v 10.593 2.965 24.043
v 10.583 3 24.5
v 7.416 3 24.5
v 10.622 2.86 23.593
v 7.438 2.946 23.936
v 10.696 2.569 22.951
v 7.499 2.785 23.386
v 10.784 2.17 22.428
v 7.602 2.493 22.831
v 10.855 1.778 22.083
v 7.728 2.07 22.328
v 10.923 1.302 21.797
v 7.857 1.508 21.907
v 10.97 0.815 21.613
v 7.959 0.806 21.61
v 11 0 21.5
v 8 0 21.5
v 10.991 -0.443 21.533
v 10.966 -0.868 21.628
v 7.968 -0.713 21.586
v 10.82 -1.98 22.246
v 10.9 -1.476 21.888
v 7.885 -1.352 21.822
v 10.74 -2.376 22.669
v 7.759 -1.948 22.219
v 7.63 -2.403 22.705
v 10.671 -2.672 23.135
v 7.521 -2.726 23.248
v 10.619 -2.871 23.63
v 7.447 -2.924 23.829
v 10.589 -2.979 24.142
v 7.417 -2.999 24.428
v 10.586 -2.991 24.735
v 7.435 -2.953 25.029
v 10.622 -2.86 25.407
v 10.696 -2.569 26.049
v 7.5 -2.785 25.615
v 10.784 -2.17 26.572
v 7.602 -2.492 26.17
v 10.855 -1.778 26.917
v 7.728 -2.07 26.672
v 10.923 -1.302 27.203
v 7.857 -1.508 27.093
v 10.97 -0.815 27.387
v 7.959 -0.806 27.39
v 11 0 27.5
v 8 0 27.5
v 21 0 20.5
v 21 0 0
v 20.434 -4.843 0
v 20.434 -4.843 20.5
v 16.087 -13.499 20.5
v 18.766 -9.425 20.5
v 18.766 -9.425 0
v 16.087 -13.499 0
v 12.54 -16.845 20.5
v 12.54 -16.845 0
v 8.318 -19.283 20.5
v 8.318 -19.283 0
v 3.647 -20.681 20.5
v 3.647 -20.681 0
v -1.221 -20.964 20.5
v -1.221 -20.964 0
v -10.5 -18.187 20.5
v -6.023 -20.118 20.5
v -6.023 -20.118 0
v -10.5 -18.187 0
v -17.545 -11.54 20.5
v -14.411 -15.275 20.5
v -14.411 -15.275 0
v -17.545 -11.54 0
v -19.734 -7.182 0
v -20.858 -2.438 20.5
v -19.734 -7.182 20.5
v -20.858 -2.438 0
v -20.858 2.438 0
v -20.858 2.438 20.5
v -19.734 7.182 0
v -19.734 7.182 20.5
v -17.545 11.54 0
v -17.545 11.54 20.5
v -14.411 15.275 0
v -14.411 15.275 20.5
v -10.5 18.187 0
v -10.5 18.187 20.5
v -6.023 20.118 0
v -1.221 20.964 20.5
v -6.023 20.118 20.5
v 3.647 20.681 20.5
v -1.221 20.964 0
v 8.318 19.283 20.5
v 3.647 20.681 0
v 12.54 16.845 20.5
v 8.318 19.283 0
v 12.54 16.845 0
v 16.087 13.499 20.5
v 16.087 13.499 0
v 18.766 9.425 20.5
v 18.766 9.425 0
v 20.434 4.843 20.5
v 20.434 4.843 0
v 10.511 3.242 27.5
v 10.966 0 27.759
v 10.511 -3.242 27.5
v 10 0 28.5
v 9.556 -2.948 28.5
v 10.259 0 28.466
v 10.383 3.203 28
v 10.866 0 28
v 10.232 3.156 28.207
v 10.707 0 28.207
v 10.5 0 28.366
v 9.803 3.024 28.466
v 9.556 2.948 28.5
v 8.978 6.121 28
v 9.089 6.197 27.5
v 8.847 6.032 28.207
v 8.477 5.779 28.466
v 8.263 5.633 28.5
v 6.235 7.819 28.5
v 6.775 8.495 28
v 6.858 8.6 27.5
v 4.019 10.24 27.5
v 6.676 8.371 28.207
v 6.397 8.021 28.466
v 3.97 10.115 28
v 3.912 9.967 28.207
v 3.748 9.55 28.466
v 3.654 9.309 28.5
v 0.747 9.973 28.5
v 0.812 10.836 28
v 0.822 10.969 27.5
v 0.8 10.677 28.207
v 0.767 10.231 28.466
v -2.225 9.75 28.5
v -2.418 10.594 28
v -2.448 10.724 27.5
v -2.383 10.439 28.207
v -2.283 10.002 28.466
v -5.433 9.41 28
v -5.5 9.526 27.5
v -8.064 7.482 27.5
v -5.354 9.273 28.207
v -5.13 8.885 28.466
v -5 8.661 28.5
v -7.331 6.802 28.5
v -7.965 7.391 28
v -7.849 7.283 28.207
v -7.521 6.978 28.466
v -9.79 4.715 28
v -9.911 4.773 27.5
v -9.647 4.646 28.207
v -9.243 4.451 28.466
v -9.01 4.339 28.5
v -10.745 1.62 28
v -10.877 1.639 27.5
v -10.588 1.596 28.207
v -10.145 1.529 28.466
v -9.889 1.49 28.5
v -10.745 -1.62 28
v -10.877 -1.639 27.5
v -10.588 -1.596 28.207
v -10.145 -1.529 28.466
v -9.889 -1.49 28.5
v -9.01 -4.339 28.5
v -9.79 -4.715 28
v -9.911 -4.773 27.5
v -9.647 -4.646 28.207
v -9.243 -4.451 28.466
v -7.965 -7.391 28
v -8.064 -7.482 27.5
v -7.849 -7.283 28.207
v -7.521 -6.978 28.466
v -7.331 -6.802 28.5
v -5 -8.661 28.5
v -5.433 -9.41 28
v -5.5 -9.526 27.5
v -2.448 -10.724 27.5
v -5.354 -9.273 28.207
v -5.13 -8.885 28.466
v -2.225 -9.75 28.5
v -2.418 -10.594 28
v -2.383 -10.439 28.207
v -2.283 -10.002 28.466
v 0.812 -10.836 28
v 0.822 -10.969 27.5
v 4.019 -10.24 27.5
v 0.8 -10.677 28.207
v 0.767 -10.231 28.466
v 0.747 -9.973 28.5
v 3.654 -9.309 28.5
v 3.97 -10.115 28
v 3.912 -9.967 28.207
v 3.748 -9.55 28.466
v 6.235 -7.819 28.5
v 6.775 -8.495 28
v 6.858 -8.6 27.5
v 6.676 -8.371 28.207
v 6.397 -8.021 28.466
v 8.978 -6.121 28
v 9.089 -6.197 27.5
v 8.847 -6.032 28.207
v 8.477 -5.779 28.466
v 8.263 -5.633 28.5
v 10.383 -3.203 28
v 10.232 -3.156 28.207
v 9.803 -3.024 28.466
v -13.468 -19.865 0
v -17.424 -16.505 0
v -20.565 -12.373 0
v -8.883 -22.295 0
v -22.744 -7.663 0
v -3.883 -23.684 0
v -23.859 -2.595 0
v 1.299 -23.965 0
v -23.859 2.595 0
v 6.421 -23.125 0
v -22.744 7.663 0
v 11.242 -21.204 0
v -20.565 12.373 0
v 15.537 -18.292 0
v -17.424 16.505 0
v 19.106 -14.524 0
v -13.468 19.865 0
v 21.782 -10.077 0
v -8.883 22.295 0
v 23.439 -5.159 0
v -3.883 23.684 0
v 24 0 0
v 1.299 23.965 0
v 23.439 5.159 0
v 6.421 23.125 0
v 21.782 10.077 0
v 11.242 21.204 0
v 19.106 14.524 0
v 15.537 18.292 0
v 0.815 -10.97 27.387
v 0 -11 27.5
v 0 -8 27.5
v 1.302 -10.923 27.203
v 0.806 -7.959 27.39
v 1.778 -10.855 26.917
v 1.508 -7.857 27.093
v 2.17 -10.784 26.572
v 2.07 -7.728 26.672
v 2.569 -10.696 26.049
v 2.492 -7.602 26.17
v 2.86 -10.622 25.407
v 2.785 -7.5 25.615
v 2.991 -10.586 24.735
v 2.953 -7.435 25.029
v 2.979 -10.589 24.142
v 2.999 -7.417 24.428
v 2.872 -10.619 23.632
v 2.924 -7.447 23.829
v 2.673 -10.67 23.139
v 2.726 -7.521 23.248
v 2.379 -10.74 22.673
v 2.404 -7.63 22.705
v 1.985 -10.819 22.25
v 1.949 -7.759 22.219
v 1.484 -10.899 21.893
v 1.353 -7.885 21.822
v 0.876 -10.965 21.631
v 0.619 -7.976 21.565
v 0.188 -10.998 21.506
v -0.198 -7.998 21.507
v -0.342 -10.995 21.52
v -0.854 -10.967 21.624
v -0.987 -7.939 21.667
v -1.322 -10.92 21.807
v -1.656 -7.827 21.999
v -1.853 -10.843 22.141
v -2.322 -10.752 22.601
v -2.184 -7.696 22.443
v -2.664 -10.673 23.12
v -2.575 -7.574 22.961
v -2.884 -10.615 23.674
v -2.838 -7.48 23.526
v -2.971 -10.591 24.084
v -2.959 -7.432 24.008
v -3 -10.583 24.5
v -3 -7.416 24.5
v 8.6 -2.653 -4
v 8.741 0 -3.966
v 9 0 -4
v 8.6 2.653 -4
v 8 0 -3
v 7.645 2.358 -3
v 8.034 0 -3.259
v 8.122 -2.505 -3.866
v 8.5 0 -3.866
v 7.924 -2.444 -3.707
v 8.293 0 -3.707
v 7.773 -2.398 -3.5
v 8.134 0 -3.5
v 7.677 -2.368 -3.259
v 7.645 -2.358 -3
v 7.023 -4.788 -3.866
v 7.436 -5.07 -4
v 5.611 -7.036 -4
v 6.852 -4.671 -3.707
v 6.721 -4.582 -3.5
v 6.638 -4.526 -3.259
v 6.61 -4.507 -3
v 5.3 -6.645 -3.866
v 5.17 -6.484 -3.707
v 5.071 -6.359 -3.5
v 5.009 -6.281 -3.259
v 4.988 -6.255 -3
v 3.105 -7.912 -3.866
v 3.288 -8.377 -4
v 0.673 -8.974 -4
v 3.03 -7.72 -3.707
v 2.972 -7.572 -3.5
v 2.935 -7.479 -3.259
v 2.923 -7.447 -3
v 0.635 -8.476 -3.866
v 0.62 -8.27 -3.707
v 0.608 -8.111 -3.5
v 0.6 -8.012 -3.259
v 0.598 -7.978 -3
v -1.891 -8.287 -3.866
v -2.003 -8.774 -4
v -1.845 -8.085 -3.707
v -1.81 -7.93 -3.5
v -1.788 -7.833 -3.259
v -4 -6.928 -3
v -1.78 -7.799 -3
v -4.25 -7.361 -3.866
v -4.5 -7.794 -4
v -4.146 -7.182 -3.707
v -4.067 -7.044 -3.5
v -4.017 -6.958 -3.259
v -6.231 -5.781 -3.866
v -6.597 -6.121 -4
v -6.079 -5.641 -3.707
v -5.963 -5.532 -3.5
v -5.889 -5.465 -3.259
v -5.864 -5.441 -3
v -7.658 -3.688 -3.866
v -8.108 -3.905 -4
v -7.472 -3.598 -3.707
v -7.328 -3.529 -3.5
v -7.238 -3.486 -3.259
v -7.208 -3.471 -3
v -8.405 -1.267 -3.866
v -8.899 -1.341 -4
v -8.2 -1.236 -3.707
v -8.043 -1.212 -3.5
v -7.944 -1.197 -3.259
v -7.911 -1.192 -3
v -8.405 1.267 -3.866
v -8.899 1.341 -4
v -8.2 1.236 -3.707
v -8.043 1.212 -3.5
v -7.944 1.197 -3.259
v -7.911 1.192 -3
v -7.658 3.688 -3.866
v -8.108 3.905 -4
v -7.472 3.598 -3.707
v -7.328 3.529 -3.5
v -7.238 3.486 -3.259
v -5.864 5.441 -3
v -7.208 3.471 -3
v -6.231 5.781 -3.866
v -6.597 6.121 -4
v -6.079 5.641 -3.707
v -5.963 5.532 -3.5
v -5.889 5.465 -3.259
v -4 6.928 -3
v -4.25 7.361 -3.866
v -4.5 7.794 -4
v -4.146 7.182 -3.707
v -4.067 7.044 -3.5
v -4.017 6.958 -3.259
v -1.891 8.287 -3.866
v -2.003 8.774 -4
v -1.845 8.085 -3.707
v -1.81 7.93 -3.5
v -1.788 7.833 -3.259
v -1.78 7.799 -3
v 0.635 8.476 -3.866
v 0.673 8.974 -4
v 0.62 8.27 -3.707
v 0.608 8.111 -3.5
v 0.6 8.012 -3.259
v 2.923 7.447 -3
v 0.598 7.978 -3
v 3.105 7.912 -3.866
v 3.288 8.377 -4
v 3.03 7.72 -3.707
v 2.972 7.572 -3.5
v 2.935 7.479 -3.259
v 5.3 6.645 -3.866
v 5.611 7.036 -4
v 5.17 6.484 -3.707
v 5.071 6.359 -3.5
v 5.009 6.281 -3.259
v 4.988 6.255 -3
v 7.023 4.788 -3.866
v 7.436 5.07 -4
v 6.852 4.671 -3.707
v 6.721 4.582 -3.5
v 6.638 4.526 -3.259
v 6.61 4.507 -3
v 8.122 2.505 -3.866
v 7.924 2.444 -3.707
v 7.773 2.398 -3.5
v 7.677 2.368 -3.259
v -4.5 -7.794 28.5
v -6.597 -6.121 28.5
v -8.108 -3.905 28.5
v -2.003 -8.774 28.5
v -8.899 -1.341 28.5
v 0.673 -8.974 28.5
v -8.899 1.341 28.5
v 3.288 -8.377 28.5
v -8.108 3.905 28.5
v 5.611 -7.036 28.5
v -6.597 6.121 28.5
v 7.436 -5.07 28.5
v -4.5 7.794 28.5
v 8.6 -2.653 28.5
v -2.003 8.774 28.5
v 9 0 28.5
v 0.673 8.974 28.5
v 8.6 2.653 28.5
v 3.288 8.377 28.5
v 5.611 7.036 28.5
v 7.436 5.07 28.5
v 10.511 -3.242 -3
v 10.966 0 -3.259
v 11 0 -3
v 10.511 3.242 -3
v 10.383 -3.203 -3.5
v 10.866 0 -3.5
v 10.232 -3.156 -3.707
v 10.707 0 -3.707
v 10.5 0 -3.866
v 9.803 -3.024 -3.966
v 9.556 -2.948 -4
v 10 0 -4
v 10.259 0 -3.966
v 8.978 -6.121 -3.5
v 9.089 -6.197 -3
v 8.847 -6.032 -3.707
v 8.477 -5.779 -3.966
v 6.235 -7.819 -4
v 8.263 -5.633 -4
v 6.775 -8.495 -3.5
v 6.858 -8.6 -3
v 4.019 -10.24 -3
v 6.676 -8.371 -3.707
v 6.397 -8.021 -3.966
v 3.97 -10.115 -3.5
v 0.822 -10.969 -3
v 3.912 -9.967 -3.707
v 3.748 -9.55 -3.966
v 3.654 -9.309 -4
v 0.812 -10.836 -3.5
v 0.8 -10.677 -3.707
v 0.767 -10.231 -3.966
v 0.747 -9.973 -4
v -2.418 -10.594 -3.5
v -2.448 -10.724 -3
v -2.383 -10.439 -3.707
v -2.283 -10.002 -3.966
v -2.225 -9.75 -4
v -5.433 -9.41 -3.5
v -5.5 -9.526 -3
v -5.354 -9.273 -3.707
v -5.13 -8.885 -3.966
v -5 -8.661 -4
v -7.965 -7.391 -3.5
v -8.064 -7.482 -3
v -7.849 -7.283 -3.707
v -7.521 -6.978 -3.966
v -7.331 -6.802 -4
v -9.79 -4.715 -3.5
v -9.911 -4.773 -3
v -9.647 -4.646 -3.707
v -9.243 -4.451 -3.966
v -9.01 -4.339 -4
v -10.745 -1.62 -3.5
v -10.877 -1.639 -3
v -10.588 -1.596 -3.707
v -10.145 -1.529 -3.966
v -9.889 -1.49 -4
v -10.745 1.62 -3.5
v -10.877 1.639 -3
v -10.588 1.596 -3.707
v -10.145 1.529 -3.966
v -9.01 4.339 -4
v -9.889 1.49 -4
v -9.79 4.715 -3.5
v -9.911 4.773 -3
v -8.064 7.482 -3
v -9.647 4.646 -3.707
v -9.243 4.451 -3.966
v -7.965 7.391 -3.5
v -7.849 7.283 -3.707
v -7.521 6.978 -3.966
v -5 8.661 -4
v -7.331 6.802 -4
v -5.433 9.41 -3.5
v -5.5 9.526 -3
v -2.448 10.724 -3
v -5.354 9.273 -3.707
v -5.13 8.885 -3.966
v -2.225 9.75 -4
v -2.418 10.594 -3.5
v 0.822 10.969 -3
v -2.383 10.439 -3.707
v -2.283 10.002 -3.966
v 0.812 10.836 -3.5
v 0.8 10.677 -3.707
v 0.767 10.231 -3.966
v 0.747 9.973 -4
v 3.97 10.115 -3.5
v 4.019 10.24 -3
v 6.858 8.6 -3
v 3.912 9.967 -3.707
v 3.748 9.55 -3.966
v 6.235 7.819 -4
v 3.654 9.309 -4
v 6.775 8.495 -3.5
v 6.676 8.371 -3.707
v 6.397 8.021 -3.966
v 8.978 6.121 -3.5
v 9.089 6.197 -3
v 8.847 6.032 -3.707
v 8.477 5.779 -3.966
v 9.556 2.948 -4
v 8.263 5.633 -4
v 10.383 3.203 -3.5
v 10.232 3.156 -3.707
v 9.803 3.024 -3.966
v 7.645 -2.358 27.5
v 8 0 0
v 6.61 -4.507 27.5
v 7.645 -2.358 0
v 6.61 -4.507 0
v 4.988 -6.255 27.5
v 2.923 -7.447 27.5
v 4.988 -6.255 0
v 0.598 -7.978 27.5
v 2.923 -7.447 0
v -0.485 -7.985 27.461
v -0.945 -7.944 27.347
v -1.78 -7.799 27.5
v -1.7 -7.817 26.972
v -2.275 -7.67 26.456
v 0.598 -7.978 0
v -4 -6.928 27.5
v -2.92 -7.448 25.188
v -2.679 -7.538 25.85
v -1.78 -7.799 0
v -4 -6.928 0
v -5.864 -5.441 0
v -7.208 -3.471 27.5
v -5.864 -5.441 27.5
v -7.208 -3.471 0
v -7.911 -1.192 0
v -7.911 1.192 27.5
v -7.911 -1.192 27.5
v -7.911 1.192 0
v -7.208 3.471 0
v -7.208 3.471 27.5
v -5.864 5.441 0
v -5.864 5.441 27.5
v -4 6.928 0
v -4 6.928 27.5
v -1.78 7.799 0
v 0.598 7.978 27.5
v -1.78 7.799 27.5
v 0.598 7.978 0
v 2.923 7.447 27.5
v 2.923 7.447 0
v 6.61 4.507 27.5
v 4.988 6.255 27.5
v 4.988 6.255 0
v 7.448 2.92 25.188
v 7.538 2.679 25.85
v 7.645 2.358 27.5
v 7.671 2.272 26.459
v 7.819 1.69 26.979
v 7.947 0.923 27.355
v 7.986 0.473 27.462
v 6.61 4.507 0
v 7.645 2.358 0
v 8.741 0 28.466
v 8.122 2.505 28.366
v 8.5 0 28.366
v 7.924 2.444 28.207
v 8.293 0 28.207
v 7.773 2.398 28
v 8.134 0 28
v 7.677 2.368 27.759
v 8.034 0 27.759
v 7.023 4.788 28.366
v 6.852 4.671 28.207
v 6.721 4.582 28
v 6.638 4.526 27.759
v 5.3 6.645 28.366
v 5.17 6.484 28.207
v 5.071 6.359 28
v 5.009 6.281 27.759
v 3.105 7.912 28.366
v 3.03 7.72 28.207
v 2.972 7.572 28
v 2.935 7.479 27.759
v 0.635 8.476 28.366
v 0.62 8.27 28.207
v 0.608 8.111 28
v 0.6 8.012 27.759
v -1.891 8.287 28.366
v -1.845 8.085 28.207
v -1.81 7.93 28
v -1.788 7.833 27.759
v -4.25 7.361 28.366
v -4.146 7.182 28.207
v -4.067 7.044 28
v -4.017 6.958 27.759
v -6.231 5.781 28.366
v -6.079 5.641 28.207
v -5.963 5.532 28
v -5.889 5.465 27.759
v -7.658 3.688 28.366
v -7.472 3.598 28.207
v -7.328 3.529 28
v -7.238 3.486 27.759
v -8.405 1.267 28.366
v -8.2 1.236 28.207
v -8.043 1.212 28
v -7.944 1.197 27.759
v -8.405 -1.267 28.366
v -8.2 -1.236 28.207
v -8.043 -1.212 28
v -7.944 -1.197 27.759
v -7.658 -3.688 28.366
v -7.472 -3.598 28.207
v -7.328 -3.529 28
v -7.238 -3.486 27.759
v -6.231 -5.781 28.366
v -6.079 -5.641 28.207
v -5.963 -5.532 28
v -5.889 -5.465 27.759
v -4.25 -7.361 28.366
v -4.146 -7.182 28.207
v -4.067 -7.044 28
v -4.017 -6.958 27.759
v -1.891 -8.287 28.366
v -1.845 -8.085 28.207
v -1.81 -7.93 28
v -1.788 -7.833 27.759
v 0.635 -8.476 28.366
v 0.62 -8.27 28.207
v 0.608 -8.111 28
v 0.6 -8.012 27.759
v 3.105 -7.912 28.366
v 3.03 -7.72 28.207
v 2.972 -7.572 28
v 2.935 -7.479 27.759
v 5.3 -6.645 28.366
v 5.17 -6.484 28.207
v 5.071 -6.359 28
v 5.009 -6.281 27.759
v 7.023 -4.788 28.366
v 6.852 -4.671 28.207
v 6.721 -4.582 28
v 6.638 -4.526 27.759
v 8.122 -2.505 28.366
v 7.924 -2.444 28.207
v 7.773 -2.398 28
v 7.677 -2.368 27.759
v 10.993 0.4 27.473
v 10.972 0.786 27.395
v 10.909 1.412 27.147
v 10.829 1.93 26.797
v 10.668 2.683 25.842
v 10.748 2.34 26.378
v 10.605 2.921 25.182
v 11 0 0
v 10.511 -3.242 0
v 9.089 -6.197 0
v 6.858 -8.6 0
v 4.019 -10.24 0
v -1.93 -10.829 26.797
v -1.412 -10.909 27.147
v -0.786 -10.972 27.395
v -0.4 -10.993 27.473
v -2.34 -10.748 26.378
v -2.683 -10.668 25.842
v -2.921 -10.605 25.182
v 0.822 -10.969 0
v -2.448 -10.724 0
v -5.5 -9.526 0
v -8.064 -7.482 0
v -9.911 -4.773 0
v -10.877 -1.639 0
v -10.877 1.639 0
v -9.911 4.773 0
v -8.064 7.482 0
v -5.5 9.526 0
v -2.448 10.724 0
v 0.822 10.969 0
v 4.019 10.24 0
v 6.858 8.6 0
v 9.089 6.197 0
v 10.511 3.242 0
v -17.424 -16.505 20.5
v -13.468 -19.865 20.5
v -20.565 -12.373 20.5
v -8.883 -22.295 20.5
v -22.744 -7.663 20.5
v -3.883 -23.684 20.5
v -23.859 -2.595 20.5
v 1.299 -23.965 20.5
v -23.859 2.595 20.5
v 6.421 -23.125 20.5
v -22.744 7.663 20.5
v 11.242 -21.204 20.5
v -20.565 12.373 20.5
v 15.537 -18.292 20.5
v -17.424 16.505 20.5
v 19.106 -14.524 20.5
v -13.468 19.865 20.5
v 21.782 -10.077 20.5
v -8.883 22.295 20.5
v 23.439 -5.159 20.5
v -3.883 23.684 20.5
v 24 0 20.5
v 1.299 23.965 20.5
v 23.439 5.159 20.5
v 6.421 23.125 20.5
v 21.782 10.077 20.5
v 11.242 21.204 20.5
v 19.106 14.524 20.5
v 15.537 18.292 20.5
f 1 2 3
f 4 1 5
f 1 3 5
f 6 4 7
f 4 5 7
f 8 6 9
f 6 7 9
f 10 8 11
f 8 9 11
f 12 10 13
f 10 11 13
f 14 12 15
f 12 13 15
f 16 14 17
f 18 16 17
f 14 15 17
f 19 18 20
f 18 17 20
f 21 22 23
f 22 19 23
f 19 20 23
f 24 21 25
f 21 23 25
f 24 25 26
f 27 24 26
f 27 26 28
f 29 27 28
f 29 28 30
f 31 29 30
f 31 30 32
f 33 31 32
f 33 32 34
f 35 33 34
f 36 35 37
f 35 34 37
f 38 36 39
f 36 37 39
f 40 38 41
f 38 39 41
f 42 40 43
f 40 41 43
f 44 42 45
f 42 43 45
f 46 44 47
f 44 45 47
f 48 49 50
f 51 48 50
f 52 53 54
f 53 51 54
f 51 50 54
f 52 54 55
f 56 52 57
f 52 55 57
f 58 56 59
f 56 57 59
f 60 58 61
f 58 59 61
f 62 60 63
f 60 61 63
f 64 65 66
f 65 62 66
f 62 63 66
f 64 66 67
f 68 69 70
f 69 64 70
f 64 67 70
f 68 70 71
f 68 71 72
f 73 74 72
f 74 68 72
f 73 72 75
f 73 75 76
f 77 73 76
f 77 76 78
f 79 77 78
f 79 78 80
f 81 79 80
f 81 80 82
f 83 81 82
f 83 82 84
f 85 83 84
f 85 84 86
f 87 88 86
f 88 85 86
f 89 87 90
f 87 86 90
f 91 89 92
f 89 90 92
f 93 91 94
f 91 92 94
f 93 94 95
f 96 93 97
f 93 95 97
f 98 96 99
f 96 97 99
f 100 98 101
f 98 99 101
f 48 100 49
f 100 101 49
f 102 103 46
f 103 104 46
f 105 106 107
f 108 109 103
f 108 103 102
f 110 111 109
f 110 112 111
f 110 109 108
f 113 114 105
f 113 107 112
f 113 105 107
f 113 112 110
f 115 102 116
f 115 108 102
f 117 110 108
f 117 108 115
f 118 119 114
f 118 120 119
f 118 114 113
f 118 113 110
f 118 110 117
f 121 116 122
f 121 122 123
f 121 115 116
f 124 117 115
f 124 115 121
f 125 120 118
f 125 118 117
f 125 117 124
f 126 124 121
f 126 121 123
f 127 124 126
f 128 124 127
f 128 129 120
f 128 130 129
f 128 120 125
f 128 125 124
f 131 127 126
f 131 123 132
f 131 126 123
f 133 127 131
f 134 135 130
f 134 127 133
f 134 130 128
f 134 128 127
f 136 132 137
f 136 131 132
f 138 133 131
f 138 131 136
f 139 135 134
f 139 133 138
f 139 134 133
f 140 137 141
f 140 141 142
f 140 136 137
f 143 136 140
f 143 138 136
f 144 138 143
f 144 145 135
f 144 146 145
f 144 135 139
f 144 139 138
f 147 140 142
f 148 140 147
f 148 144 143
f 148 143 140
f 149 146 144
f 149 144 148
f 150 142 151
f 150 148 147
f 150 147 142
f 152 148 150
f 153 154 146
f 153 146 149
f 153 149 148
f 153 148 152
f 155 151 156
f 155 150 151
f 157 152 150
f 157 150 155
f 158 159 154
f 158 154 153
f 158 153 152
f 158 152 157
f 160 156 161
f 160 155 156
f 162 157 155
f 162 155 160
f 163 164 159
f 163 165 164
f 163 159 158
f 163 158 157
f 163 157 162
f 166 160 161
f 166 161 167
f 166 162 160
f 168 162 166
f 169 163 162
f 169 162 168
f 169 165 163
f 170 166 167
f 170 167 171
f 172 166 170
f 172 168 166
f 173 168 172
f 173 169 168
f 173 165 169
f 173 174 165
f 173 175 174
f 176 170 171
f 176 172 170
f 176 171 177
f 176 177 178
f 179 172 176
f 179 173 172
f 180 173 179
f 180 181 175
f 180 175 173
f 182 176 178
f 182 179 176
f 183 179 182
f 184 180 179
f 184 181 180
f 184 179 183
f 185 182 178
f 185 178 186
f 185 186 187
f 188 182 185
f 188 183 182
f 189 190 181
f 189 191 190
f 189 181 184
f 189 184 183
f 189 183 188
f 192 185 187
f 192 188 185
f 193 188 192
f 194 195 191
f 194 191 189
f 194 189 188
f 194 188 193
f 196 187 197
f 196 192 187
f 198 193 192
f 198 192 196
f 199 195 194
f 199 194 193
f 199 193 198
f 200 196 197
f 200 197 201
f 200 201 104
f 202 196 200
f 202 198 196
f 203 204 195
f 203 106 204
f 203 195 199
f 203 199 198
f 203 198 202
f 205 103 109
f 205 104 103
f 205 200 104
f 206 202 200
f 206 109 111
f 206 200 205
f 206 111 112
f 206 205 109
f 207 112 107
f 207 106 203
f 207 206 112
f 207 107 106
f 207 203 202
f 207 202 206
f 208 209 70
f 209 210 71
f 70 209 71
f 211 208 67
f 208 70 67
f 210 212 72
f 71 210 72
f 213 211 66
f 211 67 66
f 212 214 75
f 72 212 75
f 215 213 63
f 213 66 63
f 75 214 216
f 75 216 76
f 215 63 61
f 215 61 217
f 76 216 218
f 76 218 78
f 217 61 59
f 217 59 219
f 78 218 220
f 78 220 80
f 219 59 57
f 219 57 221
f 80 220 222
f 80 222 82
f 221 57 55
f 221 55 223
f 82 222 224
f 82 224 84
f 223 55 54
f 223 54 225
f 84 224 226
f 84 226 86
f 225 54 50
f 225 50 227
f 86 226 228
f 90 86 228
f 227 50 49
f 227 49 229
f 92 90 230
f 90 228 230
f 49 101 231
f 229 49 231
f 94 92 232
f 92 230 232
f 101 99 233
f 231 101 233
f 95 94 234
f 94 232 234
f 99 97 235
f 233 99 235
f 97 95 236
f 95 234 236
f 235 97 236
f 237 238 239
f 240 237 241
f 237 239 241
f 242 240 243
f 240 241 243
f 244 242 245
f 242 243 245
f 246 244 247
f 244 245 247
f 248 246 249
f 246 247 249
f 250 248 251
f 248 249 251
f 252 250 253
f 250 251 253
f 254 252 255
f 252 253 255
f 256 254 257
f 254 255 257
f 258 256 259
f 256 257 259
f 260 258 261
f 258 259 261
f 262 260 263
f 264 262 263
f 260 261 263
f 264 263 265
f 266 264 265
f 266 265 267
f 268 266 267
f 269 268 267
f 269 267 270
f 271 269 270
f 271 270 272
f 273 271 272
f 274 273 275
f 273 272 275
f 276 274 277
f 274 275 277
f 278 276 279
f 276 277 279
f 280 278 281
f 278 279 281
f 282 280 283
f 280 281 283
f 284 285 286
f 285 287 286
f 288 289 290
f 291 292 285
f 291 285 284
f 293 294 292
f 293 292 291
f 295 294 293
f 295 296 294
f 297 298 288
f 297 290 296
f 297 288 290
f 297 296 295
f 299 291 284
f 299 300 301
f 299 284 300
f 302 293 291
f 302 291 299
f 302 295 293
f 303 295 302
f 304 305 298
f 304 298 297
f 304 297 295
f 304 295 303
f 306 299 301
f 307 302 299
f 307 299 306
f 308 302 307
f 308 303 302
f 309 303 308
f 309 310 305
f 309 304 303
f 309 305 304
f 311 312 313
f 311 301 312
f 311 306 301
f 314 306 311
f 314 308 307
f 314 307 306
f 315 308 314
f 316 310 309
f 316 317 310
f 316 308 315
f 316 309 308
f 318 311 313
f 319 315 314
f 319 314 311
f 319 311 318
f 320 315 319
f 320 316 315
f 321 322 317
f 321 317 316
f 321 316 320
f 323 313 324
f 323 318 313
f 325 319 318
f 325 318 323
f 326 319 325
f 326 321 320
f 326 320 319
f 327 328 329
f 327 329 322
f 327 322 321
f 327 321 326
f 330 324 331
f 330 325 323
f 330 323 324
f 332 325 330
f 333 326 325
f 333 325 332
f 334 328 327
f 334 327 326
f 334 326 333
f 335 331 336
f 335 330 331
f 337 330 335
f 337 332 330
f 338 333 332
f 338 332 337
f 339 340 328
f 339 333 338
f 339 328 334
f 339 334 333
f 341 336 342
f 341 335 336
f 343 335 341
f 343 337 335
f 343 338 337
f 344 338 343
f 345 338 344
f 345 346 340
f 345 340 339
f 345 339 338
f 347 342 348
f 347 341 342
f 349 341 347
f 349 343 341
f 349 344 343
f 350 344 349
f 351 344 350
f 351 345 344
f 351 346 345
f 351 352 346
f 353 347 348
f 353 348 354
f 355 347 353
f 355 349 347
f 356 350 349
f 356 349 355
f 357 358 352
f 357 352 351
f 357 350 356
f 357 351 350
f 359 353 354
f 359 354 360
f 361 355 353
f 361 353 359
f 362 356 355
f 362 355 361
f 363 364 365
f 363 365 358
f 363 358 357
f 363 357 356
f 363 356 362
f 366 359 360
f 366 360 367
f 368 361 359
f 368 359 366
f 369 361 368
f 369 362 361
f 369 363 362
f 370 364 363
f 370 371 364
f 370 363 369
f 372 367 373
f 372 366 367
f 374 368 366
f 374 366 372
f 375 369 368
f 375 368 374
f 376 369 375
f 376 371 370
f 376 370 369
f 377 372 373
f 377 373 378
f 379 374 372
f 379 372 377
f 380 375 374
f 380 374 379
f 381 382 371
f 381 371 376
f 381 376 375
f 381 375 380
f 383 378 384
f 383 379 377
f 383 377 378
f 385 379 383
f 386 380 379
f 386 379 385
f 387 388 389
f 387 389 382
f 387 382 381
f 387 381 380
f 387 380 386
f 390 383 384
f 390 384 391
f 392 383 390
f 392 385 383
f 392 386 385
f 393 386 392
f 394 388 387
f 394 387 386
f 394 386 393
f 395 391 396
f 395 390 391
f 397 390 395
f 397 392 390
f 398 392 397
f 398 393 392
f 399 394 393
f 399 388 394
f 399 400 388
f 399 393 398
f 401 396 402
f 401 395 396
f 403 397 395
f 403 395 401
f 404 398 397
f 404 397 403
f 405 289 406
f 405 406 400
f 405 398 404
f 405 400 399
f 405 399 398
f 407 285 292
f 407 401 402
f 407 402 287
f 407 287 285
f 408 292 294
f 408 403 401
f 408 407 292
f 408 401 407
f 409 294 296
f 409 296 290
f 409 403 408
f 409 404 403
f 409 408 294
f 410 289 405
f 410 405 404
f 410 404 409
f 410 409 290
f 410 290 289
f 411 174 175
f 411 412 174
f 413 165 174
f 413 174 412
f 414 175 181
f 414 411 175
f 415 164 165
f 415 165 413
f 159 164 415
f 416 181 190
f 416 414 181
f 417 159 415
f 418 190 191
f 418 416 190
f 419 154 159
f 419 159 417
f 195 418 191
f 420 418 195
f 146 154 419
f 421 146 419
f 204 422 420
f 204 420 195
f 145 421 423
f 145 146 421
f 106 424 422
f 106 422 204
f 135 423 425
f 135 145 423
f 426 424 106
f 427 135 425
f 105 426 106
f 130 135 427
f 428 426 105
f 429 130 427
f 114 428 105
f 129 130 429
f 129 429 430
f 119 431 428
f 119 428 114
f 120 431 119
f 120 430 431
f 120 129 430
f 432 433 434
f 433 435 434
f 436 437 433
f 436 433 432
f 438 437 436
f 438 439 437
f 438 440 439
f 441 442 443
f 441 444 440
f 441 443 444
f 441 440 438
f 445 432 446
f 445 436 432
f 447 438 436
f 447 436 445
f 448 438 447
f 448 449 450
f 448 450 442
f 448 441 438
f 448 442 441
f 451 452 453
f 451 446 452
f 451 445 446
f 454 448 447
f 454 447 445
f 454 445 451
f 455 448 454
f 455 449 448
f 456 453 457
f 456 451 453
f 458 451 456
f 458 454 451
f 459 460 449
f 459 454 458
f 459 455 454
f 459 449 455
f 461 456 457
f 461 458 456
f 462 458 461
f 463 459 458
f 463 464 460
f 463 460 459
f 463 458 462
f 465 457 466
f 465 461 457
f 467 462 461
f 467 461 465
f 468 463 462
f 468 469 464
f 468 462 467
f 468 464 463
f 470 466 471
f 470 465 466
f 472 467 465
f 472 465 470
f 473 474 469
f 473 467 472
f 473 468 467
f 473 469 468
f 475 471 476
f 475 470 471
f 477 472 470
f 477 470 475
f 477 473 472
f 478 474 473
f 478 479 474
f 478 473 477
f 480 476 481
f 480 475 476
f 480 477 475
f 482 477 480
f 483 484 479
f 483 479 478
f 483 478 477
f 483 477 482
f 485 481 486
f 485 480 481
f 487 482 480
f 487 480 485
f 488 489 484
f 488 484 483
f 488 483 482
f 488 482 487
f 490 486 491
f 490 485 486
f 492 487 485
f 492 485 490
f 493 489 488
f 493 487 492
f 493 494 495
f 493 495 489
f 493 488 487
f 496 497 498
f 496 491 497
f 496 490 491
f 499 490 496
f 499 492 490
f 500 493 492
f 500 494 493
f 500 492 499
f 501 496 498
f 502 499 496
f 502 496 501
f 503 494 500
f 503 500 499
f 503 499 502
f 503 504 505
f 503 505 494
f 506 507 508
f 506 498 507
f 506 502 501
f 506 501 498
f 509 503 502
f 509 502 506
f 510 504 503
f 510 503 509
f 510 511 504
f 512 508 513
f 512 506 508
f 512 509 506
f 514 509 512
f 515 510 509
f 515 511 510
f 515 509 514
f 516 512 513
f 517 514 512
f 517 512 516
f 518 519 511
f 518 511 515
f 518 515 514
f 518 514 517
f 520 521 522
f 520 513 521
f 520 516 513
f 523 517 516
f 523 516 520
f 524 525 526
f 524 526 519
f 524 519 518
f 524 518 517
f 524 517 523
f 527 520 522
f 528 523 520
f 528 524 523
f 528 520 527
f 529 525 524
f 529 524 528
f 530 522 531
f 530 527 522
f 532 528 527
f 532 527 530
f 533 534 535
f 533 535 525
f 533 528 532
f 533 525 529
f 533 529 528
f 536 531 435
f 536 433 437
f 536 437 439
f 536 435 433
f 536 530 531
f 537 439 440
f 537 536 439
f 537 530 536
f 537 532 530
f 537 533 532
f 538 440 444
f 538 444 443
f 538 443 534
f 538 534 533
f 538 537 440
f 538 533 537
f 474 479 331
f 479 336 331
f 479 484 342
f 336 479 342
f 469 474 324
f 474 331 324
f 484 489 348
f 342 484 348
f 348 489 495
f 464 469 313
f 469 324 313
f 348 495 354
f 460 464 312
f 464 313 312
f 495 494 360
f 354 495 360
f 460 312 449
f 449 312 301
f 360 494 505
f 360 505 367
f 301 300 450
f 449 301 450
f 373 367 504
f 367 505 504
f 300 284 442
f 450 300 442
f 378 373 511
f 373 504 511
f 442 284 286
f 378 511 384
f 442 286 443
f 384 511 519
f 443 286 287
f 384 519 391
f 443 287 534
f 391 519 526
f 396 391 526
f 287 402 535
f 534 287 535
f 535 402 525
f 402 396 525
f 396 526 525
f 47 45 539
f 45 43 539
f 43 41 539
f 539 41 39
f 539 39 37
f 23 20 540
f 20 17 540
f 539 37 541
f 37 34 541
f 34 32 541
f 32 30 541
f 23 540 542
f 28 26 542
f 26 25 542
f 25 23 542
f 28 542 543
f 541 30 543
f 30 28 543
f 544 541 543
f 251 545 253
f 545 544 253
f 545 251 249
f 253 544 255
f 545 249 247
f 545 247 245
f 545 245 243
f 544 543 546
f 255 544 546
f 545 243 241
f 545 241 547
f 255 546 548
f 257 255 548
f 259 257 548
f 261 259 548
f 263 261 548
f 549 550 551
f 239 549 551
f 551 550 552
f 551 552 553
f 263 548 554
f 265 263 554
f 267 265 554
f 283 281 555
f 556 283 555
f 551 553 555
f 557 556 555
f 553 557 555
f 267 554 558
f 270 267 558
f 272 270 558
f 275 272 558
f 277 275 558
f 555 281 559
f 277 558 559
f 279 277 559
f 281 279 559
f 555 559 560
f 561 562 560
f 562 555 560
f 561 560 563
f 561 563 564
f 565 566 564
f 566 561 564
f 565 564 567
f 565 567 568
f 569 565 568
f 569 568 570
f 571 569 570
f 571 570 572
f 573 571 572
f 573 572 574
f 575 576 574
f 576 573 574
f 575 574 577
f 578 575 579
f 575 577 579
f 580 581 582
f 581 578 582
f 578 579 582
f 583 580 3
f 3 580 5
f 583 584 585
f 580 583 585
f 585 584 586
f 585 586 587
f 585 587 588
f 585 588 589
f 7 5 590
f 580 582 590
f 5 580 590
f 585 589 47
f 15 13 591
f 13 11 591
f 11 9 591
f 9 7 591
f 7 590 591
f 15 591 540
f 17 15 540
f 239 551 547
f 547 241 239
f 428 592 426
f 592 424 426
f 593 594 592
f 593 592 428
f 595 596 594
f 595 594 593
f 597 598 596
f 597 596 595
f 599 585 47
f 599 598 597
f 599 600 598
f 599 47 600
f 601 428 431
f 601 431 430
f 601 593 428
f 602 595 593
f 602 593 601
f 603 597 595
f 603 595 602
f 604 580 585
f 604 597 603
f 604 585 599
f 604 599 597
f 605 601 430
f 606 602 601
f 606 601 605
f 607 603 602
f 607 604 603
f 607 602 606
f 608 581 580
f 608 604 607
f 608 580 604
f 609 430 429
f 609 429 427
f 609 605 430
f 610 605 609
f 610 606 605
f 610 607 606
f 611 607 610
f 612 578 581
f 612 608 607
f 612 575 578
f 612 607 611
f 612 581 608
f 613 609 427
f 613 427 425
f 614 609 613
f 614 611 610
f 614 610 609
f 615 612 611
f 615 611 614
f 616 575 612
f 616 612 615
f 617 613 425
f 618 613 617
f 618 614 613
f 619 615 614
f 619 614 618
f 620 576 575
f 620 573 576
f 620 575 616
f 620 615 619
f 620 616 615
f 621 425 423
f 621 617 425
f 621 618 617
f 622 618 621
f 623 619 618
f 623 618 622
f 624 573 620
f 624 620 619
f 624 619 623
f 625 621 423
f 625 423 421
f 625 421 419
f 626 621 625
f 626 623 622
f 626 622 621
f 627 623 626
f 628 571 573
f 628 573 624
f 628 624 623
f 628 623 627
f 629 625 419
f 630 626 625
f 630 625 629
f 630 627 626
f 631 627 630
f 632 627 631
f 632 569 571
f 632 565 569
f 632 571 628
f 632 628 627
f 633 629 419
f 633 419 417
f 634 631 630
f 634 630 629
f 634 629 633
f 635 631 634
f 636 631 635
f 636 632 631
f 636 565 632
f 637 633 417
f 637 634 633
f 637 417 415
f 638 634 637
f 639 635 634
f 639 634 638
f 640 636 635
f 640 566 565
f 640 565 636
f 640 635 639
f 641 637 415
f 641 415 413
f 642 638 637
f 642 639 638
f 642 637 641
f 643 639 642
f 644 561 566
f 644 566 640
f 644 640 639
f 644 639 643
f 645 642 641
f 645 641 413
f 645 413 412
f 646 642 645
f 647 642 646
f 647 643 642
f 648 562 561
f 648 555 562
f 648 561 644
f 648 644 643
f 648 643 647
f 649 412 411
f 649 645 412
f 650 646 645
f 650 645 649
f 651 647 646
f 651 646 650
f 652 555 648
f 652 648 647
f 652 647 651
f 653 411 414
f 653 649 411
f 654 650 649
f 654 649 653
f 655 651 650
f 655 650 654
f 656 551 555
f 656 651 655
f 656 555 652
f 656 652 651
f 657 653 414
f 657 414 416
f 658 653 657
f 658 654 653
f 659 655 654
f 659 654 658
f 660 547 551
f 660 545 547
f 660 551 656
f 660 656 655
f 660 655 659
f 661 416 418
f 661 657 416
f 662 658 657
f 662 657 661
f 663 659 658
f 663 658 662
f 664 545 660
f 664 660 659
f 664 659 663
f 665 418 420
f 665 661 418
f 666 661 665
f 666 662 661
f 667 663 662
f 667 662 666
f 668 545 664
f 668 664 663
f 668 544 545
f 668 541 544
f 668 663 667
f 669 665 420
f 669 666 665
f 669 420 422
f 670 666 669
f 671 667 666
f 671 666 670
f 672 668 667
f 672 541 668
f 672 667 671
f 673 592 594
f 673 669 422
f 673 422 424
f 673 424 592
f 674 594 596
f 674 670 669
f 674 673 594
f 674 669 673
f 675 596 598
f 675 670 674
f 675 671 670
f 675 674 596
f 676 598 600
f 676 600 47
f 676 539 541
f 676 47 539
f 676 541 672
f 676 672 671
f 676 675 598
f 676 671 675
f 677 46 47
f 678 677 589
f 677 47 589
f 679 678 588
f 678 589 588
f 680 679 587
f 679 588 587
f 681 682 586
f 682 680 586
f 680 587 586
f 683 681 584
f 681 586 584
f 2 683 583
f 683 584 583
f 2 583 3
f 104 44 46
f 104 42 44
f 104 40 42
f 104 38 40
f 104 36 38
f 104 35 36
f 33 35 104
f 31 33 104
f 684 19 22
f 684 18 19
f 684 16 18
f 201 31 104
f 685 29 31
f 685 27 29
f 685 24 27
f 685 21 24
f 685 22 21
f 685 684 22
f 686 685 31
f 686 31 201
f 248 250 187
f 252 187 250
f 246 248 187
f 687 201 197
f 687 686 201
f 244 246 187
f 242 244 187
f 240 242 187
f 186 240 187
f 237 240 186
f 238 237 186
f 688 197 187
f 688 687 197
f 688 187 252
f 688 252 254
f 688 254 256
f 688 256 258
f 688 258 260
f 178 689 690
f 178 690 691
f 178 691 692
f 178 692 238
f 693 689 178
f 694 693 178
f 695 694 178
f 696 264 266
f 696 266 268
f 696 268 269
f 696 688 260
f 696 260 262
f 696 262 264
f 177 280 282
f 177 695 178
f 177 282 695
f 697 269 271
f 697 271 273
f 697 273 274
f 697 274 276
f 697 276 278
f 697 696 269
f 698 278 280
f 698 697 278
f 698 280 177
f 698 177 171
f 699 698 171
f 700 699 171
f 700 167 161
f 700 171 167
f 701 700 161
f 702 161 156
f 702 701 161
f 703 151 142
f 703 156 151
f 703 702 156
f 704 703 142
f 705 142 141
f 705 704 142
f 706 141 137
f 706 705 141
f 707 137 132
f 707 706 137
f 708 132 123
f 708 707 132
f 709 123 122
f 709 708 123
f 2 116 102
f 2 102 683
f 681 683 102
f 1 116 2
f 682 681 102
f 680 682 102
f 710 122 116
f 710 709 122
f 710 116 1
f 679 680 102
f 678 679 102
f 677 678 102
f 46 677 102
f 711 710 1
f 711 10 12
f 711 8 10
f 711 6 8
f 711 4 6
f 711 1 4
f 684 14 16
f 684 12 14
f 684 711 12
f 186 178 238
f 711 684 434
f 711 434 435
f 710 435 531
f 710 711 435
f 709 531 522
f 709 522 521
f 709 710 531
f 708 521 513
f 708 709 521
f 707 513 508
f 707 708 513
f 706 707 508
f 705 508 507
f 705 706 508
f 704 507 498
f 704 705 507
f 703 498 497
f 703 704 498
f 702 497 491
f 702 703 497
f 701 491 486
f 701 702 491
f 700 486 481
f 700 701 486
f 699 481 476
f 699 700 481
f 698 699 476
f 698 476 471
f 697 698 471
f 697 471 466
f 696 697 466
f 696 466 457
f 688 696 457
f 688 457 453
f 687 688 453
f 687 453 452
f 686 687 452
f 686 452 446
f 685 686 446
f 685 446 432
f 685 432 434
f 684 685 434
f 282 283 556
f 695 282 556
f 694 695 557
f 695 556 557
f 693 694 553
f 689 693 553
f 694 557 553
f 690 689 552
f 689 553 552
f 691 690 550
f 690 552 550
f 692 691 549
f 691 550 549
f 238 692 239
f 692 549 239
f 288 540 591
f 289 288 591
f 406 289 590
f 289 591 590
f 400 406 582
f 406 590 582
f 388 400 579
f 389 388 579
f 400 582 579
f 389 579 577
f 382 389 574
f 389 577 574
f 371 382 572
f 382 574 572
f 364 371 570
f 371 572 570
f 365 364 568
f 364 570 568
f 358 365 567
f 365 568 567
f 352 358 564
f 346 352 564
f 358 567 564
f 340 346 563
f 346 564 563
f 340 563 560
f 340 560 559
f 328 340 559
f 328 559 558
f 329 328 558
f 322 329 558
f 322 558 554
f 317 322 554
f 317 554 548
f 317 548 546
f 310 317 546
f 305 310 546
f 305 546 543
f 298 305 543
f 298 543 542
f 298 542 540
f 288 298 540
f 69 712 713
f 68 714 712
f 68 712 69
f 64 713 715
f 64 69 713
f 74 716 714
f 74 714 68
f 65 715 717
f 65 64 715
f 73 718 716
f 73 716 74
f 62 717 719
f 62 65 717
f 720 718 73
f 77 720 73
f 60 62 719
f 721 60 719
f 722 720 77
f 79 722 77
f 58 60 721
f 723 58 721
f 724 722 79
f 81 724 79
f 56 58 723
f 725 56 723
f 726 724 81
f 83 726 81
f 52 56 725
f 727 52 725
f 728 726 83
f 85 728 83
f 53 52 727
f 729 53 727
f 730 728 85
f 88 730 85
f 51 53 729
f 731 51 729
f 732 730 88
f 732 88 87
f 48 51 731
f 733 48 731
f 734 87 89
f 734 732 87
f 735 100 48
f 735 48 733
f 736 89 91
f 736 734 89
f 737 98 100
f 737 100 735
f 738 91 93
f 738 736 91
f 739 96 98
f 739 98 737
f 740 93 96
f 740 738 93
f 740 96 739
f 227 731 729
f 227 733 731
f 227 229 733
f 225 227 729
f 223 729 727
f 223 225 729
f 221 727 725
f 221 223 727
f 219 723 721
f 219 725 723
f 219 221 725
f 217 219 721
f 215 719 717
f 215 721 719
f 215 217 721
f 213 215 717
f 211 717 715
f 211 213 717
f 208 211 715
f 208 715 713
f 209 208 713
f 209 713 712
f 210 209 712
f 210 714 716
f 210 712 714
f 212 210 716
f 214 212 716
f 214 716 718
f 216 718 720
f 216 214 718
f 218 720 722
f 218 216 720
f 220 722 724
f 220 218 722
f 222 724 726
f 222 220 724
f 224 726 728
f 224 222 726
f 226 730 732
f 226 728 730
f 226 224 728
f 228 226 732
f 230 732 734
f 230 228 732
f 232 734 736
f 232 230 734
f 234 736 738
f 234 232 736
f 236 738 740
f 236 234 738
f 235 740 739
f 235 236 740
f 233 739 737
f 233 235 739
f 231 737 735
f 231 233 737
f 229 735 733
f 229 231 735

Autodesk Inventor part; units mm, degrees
ref_plane "YZ Plane" through (0, 0, 0) normal (1, 0, 0) x (0, 1, 0)
ref_plane "XZ Plane" through (0, 0, 0) normal (0, 1, 0) x (-1, 0, 0)
ref_plane "XY Plane" through (0, 0, 0) normal (0, 0, 1) x (1, 0, 0)
sketch "Sketch1" plane through (0, 0, 0) normal (0, 0, 1) x (1, 0, 0)
  circle A0 centre (0, 0) radius 24
  circle A1 centre (0, 0) radius 21
  circle A2 centre (0, 0) radius 8
  circle A3 centre (0, 0) radius 11
  dimension "d0" = 48
  dimension "d1" = 3
  dimension "d2" = 16
  dimension "d3" = 3
extrude "Extrusion1" add sketch "Sketch1" along normal blind 20.5 contours A0
extrude "Extrusion2" add sketch "Sketch1" along normal blind 28.5 and the other way blind 4 contours A3
sketch "Sketch2" plane through (0, 0, 0) normal (0, 1, 0) x (-1, 0, 0)
  line L0 (-11, -4) -> (-11, 28.5) projected
  line L1 (-8, 28.5) -> (8, 28.5) projected
  line L2 (0, 28.5) -> (0, 24.5)
  circle A0 centre (0, 24.5) radius 3
  point P0 (0, 0)
  dimension "d10" = 4
  dimension "d11" = 6
extrude "Extrusion3" cut sketch "Sketch2" against normal blind 28.5
sketch "Sketch3" plane through (0, 0, 0) normal (1, 0, 0) x (0, 1, 0)
  line L0 (-8, 28.5) -> (8, 28.5) projected
  line L1 (0, 28.5) -> (0, 24.5)
  circle A0 centre (0, 24.5) radius 3
  point P0 (0, 0)
  dimension "d14" = 4
  dimension "d15" = 6
extrude "Extrusion4" cut sketch "Sketch3" along normal blind 28.5
fillet "Fillet1" radius 1 4 edges at (-11, 0, 28.5) (-8, 0, 28.5) (-11, 0, -4) (-8, 0, -4)
properties part number "2"
